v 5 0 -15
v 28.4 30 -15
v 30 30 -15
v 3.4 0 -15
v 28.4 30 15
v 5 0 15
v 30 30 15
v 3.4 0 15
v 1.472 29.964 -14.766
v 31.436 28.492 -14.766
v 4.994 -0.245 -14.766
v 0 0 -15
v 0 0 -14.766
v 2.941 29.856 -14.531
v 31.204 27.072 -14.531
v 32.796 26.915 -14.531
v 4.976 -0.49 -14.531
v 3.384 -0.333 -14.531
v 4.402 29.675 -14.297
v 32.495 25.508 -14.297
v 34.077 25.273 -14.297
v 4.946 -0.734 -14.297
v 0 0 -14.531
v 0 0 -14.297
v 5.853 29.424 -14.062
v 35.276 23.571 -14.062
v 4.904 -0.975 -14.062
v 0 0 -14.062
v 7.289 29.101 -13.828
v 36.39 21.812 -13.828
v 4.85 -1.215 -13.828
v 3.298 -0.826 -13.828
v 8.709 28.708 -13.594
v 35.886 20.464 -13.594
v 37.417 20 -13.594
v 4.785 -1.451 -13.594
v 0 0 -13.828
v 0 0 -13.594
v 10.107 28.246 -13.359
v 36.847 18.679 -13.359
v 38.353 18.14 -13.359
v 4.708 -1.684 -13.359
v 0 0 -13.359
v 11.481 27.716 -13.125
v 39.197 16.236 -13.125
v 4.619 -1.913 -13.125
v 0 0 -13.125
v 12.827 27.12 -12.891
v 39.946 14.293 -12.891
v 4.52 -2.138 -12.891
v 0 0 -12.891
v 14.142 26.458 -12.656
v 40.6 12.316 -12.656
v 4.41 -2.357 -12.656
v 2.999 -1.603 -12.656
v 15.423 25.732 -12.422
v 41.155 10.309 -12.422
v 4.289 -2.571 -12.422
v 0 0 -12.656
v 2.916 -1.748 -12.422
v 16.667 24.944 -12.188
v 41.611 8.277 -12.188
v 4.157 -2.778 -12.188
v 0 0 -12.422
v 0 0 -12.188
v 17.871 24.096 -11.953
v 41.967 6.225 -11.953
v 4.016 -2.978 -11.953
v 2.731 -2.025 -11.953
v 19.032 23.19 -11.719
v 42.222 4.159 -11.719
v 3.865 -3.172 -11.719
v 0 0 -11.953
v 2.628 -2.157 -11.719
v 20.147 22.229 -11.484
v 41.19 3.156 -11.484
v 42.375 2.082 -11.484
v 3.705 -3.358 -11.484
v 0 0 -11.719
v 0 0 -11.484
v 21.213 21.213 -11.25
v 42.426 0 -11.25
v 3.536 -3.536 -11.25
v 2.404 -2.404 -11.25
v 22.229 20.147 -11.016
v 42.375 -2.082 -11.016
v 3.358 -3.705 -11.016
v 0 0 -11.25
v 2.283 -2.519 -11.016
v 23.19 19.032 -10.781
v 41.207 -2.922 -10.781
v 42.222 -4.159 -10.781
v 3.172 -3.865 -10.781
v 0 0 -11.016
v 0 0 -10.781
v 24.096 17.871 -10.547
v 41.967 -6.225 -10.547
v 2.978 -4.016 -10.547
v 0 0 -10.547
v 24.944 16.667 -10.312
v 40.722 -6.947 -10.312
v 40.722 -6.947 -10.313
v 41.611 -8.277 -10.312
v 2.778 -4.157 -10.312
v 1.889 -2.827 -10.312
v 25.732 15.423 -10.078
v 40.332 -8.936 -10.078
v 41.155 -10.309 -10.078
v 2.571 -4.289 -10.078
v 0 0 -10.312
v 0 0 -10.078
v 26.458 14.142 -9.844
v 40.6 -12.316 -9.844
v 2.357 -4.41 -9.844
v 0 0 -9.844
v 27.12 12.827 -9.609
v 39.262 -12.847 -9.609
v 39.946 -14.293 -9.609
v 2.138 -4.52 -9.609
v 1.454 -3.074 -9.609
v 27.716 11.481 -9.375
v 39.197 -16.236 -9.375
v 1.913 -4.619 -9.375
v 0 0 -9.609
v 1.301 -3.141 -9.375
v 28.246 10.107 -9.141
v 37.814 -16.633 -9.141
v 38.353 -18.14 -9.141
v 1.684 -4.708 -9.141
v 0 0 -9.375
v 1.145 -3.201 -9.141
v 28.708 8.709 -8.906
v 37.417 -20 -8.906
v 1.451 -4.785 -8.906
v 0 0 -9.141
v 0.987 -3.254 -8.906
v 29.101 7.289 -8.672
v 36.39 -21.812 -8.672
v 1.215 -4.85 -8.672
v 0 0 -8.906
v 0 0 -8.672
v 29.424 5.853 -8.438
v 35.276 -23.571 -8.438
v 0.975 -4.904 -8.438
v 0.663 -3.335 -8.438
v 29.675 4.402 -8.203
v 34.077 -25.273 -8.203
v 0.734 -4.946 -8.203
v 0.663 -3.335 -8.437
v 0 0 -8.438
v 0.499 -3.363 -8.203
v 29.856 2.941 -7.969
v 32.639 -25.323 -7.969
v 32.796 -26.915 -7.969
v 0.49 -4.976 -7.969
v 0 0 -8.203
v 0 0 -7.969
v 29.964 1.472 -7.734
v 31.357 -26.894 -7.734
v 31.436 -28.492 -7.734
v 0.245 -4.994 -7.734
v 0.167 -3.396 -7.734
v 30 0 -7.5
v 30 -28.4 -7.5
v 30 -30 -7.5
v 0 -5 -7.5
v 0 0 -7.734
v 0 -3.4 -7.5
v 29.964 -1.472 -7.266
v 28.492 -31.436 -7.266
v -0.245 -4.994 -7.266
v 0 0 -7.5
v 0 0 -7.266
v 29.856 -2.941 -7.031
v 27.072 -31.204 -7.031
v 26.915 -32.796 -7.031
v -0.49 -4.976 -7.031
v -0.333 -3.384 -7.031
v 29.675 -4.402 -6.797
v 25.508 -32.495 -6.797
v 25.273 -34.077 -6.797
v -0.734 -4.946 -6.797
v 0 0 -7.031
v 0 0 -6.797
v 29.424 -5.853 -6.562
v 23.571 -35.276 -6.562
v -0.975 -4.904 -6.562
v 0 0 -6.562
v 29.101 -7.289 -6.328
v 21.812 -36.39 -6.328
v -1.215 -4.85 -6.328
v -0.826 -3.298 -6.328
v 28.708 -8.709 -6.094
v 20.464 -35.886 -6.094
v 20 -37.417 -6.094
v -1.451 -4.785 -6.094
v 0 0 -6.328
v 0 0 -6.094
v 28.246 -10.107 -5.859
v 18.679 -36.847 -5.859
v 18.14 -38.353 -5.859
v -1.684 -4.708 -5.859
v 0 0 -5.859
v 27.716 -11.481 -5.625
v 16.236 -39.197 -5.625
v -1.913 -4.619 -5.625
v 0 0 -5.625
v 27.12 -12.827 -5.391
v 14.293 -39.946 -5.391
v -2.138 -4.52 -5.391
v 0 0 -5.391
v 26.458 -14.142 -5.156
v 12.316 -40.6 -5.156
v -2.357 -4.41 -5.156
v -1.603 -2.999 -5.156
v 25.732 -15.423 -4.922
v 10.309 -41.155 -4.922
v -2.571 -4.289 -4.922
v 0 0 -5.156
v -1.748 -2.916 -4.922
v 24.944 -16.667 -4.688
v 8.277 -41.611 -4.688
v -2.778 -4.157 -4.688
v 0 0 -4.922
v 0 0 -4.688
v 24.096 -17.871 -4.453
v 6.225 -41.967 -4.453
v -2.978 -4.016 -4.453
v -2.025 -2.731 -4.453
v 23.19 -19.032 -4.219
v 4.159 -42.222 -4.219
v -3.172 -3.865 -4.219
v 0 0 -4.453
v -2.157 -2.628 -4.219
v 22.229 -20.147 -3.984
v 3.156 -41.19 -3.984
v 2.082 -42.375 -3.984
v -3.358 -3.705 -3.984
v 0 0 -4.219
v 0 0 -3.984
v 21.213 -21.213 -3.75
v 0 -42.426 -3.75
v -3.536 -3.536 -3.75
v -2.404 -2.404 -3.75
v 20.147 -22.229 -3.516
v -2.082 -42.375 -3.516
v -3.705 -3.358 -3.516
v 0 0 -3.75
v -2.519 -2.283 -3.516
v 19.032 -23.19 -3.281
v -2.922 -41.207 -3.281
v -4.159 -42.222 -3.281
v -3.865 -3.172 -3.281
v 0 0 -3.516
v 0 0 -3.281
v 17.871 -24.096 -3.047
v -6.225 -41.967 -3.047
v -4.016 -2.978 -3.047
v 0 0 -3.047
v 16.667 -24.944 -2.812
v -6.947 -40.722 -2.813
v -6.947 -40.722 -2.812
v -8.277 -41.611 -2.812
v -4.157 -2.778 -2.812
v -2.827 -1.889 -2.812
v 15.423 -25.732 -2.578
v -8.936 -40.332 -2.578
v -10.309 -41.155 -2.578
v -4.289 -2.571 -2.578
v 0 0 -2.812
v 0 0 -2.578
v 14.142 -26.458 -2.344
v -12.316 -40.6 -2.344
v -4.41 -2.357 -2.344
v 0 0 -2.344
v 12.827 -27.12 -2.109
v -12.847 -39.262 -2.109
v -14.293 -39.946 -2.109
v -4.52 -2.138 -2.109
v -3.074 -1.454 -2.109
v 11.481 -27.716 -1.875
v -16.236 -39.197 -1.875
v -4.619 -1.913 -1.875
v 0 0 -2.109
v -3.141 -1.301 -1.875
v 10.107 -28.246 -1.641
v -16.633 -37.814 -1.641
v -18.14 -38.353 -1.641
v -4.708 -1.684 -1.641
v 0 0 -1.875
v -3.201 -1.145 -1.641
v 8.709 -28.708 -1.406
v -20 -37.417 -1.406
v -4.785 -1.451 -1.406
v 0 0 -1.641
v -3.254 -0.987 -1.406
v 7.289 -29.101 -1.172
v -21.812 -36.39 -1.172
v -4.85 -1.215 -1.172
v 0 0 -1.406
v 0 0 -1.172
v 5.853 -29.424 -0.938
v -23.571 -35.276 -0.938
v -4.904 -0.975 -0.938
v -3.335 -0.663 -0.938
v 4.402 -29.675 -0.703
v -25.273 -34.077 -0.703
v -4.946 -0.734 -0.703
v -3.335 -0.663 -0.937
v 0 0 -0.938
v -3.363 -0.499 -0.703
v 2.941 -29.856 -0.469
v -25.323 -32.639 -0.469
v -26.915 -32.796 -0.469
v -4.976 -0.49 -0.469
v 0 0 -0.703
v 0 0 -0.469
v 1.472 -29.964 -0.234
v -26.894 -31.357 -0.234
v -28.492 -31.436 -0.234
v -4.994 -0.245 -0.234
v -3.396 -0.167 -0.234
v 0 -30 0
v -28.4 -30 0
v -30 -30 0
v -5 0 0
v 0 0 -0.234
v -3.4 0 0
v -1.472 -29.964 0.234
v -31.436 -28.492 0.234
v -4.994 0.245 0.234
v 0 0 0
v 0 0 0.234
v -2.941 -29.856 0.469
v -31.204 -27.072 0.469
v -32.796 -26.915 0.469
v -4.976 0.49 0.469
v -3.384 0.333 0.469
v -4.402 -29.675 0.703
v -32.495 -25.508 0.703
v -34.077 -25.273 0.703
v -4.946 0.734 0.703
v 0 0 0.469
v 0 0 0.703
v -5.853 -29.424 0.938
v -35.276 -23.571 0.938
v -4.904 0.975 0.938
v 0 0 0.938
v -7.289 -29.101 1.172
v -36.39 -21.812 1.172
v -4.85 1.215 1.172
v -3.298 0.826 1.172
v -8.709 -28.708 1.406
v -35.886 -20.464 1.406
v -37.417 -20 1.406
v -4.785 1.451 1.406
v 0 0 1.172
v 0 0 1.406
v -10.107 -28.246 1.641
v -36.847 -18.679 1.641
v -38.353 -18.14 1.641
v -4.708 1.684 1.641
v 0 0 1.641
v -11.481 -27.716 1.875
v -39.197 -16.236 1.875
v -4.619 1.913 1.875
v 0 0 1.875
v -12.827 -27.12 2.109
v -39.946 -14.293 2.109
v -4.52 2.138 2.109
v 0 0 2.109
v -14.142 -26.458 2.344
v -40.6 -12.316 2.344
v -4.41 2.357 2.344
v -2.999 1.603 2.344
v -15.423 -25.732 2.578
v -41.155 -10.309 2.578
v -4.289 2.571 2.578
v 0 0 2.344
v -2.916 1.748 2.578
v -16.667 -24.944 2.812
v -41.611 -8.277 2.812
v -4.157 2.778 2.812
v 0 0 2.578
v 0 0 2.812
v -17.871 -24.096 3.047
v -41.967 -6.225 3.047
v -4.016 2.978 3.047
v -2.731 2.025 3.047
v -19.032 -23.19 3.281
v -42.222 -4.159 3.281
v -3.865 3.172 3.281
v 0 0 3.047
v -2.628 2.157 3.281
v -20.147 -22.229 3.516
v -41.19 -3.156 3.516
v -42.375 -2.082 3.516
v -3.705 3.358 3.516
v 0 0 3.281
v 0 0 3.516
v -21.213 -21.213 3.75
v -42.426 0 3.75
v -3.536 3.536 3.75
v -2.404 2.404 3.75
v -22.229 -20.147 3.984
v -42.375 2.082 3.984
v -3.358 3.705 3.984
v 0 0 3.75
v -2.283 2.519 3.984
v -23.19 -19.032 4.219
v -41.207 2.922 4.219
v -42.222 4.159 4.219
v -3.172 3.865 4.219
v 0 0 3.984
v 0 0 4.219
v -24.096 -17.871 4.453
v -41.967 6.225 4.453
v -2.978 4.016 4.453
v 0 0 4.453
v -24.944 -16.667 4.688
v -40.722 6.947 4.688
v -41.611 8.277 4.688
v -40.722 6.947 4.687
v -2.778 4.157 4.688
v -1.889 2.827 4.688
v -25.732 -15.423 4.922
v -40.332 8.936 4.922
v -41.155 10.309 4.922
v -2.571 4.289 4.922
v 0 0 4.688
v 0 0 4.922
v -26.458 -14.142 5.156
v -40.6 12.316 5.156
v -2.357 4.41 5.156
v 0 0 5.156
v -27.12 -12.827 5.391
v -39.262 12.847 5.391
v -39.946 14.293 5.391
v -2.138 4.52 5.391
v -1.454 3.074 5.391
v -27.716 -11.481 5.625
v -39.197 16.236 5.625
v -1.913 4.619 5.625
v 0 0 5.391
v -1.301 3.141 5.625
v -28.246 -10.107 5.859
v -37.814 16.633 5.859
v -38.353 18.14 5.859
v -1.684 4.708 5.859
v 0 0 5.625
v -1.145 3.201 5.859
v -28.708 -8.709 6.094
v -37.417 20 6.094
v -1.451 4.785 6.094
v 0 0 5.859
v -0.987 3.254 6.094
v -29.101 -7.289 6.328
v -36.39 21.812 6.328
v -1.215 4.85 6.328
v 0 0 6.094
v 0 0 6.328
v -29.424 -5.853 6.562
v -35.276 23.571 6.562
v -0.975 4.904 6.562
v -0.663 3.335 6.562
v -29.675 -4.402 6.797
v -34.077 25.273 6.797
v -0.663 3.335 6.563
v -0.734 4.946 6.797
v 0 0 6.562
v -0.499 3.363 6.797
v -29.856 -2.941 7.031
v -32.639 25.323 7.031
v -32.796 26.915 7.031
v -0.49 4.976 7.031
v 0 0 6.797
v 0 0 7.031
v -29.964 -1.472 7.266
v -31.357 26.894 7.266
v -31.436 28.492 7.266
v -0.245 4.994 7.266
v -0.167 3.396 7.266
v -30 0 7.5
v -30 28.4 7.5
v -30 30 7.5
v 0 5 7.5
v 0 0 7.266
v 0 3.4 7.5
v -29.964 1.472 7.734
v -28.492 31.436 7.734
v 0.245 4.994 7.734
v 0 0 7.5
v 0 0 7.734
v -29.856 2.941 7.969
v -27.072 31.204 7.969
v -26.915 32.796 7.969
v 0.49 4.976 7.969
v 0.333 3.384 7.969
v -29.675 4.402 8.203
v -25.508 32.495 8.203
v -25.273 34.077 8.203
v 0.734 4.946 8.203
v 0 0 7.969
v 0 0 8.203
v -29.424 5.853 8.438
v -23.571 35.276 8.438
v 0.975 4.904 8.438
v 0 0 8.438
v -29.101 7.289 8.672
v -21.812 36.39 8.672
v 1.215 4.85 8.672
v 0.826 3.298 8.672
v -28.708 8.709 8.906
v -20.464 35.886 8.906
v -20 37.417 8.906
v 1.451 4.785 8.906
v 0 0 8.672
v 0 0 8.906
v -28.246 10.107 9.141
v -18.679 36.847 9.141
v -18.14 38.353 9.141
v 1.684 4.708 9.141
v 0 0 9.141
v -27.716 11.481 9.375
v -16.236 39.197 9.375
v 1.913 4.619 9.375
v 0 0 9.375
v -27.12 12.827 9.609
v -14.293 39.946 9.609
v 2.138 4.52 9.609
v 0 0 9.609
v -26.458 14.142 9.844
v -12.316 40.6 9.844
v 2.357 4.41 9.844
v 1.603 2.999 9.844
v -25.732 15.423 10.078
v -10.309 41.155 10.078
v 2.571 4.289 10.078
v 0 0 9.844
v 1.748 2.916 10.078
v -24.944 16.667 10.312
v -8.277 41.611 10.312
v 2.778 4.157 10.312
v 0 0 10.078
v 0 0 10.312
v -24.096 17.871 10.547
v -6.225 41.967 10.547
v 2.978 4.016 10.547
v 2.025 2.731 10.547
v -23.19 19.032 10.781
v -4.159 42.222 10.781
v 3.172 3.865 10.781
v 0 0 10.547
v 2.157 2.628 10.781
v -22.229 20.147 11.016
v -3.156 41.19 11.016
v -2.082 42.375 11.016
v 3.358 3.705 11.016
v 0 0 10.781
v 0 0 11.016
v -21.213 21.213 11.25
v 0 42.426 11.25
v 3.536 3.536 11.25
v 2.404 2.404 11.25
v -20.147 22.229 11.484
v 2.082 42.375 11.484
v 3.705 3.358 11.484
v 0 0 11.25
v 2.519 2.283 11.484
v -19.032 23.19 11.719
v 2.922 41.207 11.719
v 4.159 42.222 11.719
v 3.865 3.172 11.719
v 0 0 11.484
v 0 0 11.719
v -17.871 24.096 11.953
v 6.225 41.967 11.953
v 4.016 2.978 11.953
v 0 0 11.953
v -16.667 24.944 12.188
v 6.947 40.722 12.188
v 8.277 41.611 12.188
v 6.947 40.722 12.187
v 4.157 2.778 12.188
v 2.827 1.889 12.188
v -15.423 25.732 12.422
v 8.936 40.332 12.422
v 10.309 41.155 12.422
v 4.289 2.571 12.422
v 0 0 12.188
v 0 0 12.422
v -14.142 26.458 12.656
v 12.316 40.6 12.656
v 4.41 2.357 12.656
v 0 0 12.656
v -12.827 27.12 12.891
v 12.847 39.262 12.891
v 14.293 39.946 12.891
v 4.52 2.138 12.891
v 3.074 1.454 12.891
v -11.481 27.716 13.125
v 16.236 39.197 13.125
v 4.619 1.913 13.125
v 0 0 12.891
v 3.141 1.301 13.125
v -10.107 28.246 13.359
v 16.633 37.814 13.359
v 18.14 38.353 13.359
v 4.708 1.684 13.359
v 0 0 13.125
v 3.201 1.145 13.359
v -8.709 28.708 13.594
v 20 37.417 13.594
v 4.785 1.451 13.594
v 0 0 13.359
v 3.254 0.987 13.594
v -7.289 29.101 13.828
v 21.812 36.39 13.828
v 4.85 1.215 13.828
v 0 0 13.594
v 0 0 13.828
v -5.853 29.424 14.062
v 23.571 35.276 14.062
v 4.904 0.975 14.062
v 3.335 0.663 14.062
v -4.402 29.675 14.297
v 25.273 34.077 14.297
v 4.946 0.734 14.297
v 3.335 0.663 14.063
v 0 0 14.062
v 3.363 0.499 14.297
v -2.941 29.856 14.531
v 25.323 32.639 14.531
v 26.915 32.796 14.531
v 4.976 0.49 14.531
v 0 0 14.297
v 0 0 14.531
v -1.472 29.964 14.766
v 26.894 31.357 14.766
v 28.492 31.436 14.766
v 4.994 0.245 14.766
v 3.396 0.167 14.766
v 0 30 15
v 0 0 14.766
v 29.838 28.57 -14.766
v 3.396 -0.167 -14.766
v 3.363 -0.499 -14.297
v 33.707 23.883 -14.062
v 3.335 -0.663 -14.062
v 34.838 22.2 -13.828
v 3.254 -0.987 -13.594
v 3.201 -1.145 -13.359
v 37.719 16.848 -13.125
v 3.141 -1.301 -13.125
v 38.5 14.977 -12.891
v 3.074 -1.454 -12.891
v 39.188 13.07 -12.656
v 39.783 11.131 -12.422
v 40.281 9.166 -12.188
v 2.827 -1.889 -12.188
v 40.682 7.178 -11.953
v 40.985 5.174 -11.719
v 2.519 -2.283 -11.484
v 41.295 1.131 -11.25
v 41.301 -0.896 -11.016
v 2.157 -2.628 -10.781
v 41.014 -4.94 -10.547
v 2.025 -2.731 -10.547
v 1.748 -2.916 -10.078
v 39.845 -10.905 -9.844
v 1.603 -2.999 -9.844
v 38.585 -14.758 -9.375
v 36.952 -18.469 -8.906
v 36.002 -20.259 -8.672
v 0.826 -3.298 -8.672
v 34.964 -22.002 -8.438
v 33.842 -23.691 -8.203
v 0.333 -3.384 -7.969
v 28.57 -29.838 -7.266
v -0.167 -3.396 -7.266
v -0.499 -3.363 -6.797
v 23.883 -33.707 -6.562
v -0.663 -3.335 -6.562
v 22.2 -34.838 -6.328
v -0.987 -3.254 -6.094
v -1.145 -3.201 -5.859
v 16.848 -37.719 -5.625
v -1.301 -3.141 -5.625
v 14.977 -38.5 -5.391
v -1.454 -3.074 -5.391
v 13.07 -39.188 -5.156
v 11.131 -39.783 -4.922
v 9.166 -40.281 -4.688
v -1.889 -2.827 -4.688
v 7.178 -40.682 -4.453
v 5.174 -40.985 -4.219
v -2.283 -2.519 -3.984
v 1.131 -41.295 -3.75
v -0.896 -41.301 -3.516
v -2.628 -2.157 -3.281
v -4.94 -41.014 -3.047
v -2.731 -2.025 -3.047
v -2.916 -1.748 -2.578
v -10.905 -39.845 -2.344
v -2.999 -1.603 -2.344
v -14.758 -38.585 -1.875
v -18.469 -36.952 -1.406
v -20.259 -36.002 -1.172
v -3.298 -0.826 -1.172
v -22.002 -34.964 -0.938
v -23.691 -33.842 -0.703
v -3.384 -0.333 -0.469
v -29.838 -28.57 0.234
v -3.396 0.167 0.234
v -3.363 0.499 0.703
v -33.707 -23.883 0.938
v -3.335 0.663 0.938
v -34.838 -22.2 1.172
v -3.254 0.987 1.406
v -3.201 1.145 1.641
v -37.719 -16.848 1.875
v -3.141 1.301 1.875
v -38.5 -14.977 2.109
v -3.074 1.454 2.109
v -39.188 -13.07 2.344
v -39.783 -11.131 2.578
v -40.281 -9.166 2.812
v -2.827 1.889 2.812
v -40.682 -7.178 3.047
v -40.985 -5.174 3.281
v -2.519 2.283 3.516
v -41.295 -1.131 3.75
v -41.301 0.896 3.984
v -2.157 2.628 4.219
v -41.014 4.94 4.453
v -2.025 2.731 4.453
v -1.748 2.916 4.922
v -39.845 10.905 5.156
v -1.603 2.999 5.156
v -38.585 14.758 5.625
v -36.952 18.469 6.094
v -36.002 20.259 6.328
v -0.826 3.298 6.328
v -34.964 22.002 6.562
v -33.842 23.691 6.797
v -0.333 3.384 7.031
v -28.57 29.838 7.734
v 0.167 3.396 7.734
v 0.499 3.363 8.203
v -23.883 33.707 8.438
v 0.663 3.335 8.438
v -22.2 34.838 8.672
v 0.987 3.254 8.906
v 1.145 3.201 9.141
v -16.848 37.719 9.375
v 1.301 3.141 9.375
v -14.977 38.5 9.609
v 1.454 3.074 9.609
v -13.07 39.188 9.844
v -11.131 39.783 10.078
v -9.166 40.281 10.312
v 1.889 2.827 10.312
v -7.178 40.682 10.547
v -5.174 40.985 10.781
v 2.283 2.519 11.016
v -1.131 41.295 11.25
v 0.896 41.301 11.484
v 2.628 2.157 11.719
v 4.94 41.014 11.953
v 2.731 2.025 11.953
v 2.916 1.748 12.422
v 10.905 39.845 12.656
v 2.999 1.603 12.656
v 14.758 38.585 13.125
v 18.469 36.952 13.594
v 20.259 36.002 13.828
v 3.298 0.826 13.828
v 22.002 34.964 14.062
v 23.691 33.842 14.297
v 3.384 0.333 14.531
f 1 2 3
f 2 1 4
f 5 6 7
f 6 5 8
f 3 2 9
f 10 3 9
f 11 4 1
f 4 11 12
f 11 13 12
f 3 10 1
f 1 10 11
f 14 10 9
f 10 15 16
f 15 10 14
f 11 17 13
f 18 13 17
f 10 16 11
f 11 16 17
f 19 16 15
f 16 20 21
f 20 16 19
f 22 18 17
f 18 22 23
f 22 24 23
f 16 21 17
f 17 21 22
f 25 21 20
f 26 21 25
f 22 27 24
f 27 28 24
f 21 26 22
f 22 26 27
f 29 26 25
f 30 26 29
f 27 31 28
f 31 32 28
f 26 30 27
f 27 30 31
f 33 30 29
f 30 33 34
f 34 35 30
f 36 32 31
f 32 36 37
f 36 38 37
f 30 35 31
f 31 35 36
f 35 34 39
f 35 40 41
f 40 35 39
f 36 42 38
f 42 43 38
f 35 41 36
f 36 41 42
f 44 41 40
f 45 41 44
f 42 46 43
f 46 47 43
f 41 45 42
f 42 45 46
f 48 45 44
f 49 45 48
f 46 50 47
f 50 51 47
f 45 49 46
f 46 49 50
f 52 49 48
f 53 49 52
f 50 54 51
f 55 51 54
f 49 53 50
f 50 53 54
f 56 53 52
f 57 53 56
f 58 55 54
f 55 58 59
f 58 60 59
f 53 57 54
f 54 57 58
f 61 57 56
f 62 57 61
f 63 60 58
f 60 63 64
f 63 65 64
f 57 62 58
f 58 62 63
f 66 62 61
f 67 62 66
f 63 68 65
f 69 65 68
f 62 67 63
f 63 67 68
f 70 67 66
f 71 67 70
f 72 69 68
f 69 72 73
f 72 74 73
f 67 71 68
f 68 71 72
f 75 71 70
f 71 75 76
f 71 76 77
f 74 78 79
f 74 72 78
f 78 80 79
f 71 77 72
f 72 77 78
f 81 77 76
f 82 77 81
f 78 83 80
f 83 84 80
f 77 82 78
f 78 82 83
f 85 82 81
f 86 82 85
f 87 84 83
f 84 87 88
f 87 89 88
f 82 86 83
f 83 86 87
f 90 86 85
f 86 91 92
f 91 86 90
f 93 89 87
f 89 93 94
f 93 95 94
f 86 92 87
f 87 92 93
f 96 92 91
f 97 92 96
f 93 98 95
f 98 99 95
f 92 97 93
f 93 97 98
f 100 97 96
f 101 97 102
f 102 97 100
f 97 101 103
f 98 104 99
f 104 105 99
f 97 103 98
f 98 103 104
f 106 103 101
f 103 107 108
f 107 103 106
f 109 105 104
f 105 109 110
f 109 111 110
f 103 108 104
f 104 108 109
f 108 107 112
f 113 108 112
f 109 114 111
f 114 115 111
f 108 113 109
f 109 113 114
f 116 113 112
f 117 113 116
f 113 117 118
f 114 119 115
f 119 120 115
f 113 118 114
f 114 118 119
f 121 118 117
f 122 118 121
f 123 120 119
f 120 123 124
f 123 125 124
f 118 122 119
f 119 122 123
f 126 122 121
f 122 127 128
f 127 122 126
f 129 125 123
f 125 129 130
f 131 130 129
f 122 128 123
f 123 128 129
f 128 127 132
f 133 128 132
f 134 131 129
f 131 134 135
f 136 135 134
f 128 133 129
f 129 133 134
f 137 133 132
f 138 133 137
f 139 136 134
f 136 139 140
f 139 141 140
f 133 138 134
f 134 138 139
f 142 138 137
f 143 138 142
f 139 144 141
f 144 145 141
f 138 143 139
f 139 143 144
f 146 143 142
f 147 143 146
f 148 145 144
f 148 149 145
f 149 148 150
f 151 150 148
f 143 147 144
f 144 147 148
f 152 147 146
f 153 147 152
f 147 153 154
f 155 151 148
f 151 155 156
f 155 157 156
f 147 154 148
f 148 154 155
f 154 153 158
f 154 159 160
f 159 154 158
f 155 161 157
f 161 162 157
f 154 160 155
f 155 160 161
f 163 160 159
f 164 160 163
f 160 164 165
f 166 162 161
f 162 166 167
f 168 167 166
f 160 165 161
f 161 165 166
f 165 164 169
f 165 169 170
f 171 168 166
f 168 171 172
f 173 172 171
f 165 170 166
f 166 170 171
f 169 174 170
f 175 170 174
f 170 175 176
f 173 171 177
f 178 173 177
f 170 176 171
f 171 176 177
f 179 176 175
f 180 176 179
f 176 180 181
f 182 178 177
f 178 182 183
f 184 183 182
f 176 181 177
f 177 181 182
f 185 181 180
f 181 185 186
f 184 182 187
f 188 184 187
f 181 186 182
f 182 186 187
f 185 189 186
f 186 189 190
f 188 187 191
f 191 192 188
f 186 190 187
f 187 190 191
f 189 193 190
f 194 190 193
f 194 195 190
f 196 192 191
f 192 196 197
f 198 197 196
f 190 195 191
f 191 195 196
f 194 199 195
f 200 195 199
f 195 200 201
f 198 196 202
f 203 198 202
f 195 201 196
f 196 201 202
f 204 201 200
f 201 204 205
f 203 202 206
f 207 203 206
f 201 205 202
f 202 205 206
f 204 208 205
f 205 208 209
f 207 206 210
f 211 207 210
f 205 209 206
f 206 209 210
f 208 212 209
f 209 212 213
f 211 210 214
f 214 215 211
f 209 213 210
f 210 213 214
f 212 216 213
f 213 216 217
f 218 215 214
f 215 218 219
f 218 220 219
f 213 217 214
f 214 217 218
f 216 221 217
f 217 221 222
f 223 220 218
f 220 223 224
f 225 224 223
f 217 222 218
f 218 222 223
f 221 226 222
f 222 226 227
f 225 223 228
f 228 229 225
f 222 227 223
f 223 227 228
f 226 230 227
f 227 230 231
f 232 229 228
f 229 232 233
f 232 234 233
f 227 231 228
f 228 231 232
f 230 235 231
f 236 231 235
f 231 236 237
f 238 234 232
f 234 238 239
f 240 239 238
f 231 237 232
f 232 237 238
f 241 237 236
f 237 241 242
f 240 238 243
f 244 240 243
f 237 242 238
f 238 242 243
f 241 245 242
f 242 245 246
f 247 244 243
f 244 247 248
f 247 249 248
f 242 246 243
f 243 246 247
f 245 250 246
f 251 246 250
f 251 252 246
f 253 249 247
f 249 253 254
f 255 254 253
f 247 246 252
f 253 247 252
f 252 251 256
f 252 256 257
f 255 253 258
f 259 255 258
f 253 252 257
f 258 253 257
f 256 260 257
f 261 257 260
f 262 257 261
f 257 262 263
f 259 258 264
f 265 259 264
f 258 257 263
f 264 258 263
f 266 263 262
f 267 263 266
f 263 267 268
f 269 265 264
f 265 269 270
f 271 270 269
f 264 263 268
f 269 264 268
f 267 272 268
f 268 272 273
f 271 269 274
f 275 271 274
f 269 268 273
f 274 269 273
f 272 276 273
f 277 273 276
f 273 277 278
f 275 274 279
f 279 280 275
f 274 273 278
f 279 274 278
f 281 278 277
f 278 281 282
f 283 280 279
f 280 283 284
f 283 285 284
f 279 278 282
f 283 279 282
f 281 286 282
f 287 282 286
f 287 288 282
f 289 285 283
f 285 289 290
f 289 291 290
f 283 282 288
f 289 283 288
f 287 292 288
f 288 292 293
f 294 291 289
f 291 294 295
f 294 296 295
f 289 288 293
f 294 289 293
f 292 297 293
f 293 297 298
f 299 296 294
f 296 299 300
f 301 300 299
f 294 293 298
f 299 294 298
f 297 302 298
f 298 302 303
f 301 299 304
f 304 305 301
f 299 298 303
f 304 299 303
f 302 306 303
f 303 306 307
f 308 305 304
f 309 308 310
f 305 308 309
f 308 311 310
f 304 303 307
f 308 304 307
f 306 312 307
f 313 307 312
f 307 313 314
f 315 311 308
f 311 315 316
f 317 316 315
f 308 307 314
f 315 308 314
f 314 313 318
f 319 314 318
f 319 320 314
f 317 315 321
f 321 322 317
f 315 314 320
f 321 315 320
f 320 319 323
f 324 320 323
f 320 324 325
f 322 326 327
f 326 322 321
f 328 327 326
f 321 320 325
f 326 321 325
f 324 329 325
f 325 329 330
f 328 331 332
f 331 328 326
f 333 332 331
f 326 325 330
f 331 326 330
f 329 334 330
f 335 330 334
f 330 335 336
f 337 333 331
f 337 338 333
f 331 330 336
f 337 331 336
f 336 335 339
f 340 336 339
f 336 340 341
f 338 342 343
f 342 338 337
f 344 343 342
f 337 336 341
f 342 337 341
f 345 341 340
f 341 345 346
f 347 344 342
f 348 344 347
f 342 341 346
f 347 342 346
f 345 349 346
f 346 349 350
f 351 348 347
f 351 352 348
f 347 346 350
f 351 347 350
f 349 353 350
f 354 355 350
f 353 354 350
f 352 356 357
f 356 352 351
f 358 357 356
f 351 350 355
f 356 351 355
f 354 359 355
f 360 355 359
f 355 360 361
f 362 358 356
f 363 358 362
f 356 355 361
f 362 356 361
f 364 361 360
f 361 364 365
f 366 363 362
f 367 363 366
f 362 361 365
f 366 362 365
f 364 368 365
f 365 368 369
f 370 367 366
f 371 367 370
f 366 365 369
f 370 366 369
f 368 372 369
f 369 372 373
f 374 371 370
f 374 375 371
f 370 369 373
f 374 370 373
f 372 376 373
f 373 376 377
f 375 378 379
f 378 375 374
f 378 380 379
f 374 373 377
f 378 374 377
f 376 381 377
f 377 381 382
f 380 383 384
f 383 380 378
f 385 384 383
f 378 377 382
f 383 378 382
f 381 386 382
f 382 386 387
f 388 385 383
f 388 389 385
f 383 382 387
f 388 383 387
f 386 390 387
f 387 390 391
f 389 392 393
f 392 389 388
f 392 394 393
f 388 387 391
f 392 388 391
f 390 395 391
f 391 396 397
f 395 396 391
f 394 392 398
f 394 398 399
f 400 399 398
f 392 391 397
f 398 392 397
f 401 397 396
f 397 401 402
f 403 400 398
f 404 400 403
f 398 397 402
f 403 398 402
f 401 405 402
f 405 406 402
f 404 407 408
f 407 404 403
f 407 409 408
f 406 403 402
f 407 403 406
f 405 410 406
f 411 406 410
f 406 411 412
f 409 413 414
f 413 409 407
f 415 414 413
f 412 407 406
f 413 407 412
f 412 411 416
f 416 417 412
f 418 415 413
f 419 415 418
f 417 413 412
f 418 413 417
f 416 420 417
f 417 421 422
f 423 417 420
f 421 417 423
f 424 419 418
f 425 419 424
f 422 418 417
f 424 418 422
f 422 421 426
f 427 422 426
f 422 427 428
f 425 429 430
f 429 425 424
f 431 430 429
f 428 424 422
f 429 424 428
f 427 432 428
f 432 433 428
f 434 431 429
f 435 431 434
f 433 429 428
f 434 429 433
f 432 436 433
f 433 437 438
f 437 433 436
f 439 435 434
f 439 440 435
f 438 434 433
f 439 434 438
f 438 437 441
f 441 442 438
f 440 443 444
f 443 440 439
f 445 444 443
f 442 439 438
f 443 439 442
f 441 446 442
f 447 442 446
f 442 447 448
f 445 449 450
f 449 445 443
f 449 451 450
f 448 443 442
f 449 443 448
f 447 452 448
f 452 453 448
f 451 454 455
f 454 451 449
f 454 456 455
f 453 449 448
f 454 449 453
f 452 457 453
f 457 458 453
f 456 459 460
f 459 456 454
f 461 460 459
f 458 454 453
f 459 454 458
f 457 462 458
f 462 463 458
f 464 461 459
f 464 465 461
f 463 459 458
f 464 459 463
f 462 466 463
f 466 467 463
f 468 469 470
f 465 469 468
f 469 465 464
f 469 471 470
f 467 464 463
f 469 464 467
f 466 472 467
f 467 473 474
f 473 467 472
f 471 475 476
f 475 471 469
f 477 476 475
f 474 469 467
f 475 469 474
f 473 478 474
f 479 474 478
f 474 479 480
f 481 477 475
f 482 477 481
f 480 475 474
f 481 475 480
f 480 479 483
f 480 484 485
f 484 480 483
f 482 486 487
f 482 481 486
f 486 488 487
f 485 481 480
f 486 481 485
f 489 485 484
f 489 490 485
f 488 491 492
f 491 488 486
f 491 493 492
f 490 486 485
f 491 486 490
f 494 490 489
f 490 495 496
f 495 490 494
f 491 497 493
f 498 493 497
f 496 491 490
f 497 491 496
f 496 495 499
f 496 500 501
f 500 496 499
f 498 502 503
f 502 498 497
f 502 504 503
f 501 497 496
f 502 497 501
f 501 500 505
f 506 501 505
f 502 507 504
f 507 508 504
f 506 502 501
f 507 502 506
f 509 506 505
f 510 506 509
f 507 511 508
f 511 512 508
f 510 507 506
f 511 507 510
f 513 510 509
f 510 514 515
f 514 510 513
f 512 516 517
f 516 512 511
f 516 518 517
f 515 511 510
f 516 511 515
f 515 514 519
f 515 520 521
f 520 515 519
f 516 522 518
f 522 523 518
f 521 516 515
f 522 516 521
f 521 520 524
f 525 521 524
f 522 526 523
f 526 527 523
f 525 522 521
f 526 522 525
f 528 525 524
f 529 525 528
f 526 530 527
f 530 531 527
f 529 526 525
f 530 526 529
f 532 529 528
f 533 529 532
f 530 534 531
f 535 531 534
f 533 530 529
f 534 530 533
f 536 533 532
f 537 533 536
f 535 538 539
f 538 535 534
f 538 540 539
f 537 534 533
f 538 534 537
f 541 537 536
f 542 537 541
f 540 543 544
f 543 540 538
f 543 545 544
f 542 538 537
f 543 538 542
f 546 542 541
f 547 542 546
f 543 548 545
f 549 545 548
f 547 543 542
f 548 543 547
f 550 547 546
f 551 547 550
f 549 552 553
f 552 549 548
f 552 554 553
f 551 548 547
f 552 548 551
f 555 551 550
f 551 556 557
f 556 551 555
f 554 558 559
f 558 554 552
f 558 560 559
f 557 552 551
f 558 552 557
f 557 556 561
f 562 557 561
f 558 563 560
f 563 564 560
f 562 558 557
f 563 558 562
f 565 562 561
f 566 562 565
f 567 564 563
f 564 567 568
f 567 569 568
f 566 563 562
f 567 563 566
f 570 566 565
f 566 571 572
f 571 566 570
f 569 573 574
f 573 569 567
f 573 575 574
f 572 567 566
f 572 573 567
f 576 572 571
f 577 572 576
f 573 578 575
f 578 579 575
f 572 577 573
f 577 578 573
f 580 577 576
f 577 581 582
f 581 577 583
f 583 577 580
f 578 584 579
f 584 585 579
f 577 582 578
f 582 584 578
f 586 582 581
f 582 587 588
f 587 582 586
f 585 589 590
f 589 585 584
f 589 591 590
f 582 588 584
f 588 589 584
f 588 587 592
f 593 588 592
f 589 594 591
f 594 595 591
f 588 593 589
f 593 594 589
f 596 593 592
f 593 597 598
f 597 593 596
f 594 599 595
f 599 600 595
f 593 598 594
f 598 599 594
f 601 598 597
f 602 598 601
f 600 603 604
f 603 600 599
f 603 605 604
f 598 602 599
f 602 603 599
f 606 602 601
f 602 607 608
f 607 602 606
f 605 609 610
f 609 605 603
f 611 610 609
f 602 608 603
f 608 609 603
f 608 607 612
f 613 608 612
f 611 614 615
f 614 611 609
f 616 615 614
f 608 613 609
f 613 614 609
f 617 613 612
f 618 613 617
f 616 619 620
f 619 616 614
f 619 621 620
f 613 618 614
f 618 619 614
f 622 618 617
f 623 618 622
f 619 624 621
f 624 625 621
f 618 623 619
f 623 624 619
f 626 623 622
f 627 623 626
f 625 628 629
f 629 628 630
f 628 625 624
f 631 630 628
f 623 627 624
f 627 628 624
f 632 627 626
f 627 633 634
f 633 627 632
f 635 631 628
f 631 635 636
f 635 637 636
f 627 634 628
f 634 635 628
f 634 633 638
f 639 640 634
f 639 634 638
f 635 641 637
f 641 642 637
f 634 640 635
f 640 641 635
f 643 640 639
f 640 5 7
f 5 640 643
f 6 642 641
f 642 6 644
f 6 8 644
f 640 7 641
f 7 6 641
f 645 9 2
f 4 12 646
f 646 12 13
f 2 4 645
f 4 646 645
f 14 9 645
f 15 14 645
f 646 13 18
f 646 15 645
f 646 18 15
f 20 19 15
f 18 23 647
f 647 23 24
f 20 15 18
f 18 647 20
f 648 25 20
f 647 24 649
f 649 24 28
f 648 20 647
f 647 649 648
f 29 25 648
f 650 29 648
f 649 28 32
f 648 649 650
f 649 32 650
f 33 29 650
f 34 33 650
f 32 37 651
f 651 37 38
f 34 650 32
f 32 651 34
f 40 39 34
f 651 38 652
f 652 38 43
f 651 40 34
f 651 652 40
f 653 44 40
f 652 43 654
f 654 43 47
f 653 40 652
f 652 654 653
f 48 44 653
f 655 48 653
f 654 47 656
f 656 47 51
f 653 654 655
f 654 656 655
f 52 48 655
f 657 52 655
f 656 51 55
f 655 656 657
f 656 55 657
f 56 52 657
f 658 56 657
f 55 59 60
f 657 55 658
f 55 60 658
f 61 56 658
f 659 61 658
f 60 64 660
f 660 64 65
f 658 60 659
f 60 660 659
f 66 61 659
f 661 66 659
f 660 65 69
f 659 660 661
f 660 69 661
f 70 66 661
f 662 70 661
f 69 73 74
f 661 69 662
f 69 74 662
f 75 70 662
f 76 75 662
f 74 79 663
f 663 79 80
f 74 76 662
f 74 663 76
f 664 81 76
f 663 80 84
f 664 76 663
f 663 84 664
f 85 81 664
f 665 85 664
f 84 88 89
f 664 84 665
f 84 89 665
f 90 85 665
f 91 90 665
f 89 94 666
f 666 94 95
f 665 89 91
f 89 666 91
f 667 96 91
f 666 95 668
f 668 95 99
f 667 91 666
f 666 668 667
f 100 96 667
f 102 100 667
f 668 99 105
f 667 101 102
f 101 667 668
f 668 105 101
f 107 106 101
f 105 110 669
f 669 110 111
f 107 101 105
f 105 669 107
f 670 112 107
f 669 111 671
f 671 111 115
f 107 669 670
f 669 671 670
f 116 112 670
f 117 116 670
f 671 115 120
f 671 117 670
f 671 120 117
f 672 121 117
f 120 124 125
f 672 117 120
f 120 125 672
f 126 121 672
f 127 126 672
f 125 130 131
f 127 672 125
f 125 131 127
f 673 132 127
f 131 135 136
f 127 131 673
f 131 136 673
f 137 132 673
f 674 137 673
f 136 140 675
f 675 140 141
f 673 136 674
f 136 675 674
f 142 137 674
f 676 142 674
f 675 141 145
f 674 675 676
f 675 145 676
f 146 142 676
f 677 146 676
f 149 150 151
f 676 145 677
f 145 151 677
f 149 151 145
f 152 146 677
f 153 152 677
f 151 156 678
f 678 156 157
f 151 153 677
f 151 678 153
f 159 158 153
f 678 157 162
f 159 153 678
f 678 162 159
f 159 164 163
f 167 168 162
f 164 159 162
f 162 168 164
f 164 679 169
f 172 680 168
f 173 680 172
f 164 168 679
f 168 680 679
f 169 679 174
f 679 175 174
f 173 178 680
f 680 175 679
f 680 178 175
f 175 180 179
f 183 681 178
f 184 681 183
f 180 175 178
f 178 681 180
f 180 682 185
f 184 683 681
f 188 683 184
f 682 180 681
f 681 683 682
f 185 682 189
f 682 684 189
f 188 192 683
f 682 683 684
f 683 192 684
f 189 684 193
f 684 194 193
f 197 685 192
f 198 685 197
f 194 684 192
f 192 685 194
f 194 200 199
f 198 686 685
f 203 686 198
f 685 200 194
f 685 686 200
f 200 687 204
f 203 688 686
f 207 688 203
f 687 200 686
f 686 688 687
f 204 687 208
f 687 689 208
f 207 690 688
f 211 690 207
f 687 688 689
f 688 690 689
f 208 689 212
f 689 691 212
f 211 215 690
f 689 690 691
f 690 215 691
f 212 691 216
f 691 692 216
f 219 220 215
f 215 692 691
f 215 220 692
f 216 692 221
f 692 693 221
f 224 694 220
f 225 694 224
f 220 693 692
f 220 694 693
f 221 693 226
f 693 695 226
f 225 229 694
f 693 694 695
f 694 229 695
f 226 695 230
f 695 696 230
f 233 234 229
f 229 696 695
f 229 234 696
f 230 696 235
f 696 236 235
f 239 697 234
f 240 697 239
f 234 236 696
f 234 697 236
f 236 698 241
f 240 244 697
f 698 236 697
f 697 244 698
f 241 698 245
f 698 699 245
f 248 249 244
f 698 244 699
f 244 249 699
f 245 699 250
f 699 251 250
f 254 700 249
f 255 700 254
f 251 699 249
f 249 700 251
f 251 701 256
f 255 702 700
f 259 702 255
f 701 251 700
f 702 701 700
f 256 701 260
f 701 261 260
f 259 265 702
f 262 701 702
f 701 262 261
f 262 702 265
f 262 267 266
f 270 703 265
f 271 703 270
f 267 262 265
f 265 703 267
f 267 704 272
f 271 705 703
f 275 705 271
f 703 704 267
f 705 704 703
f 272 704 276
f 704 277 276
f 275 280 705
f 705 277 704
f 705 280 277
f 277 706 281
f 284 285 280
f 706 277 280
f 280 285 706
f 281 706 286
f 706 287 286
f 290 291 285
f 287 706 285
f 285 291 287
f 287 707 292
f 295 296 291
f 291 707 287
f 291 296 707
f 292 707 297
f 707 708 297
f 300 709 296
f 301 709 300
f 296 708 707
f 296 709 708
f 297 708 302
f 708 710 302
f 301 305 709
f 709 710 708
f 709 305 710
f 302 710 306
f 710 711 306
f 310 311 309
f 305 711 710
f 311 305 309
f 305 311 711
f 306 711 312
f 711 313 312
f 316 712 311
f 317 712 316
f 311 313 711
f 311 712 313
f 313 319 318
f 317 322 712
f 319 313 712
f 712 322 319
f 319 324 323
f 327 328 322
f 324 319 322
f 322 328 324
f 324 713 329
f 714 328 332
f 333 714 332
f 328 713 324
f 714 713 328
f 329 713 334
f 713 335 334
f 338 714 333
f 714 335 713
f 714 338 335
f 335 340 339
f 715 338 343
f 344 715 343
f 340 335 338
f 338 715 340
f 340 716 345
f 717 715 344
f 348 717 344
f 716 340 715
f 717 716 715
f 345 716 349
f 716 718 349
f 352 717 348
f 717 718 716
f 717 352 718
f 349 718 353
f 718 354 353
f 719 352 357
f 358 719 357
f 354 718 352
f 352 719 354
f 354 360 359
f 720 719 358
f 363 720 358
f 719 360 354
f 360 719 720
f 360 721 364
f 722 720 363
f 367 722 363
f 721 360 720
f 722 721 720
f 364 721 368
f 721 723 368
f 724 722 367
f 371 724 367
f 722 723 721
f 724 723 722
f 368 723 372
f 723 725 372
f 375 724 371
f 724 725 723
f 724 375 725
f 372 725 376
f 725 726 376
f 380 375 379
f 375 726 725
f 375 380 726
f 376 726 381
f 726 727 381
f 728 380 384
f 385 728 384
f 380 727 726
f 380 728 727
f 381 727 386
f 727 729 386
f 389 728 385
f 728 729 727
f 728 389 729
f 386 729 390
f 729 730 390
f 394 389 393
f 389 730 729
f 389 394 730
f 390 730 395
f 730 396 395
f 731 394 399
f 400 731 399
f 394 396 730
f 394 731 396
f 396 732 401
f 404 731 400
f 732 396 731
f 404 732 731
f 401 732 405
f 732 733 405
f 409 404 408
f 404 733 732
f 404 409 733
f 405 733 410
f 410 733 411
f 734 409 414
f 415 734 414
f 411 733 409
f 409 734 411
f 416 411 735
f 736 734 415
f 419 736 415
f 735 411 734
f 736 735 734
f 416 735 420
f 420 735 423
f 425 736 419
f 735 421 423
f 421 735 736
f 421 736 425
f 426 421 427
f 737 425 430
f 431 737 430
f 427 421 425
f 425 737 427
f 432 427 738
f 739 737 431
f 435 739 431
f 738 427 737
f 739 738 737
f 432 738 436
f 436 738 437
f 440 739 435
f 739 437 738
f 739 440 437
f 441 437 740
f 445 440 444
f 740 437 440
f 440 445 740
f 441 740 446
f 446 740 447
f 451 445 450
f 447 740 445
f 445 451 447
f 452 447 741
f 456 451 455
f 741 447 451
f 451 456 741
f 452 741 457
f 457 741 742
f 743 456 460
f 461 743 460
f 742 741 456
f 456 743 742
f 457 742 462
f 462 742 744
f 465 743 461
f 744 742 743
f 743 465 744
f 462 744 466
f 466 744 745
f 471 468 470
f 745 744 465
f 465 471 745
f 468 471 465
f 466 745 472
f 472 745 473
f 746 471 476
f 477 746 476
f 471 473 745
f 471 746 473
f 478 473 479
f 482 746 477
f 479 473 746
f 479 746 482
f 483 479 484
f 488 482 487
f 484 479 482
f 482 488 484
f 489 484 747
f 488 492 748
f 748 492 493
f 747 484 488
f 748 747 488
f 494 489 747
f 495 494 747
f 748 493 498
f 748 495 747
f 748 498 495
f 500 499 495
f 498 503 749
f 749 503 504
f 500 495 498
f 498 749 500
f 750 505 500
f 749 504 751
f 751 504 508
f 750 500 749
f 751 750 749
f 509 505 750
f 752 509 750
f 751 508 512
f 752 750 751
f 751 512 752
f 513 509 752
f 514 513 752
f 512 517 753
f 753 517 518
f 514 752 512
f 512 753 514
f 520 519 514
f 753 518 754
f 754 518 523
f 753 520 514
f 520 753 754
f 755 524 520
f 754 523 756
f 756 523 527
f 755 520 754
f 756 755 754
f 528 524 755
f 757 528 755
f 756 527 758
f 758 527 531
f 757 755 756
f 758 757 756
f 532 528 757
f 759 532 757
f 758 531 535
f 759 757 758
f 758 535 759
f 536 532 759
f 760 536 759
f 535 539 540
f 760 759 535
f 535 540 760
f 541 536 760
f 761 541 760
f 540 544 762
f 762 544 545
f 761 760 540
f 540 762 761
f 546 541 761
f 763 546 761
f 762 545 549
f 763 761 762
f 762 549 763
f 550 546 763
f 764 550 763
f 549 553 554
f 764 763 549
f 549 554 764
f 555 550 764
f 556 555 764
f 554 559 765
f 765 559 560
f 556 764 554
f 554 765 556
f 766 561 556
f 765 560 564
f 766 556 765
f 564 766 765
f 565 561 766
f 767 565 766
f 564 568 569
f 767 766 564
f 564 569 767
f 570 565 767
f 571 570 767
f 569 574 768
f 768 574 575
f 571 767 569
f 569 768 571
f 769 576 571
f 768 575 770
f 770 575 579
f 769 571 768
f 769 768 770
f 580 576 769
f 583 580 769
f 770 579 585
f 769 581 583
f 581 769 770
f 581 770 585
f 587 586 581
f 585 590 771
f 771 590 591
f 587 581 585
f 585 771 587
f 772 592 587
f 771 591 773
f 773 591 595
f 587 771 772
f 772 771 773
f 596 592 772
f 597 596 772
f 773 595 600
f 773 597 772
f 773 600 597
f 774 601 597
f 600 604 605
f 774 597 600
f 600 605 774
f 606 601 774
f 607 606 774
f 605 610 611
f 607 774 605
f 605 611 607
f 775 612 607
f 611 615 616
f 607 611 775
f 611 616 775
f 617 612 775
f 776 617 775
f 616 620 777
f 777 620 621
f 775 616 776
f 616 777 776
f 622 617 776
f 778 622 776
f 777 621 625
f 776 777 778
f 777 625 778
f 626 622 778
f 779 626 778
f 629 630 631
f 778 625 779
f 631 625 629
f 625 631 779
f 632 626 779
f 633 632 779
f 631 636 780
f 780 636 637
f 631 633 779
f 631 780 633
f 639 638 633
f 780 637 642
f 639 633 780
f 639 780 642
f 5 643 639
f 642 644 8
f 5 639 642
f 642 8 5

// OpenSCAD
// Lab Funnel Design (Corrected)
// Units: millimetres
// Orientation: Upright, wide opening at top, resting on XY plane at z=0.

// Global settings
$fn = 128; // High resolution for smooth curves

// Dimensions
// Spout (Tube)
spout_outer_diameter = 10;
spout_inner_diameter = 6.8; // 10 - 2*1.6
spout_length = 20;
spout_wall_thickness = 1.6;

// Cone (Funnel)
cone_bottom_diameter = 10; // Matches spout outer diameter
cone_top_diameter = 60;
cone_bottom_z = 20; // Start of cone
cone_top_z = 50;    // End of cone (rim)
cone_wall_thickness = 1.6;

// Calculated Cone Dimensions
cone_bottom_radius = cone_bottom_diameter / 2;
cone_top_radius = cone_top_diameter / 2;
cone_height = cone_top_z - cone_bottom_z;

// Inner dimensions at the junction (z=20)
// The inner bore continues from the spout (6.8mm)
inner_bore_diameter = spout_inner_diameter;
inner_bore_radius = inner_bore_diameter / 2;

// Inner dimensions at the top rim (z=50)
// Outer is 60mm, wall is 1.6mm, so inner is 60 - 2*1.6 = 56.8mm
inner_top_diameter = cone_top_diameter - (2 * cone_wall_thickness);
inner_top_radius = inner_top_diameter / 2;

// Main Body Construction
// We build the solid using linear_extrude with twist=360.
// The profile is defined in the XY plane (X=radius, Y=height).
// We subtract the inner void from the outer solid.

difference() {
    // 1. Outer Shell
    linear_extrude(height = cone_height, twist = 360, center = true) {
        polygon(points = [
            [0, 0],
            [cone_bottom_radius, 0],
            [cone_top_radius, cone_height],
            [0, cone_height]
        ]);
    }
    
    // 2. Inner Void (Hole)
    // The inner void is a cylinder from z=0 to z=20, then a cone from z=20 to z=50.
    // We must subtract this void to create the bore.
    linear_extrude(height = cone_height, twist = 360, center = true) {
        polygon(points = [
            [0, 0],
            [inner_bore_radius, 0],
            [inner_top_radius, cone_height],
            [0, cone_height]
        ]);
    }
}
